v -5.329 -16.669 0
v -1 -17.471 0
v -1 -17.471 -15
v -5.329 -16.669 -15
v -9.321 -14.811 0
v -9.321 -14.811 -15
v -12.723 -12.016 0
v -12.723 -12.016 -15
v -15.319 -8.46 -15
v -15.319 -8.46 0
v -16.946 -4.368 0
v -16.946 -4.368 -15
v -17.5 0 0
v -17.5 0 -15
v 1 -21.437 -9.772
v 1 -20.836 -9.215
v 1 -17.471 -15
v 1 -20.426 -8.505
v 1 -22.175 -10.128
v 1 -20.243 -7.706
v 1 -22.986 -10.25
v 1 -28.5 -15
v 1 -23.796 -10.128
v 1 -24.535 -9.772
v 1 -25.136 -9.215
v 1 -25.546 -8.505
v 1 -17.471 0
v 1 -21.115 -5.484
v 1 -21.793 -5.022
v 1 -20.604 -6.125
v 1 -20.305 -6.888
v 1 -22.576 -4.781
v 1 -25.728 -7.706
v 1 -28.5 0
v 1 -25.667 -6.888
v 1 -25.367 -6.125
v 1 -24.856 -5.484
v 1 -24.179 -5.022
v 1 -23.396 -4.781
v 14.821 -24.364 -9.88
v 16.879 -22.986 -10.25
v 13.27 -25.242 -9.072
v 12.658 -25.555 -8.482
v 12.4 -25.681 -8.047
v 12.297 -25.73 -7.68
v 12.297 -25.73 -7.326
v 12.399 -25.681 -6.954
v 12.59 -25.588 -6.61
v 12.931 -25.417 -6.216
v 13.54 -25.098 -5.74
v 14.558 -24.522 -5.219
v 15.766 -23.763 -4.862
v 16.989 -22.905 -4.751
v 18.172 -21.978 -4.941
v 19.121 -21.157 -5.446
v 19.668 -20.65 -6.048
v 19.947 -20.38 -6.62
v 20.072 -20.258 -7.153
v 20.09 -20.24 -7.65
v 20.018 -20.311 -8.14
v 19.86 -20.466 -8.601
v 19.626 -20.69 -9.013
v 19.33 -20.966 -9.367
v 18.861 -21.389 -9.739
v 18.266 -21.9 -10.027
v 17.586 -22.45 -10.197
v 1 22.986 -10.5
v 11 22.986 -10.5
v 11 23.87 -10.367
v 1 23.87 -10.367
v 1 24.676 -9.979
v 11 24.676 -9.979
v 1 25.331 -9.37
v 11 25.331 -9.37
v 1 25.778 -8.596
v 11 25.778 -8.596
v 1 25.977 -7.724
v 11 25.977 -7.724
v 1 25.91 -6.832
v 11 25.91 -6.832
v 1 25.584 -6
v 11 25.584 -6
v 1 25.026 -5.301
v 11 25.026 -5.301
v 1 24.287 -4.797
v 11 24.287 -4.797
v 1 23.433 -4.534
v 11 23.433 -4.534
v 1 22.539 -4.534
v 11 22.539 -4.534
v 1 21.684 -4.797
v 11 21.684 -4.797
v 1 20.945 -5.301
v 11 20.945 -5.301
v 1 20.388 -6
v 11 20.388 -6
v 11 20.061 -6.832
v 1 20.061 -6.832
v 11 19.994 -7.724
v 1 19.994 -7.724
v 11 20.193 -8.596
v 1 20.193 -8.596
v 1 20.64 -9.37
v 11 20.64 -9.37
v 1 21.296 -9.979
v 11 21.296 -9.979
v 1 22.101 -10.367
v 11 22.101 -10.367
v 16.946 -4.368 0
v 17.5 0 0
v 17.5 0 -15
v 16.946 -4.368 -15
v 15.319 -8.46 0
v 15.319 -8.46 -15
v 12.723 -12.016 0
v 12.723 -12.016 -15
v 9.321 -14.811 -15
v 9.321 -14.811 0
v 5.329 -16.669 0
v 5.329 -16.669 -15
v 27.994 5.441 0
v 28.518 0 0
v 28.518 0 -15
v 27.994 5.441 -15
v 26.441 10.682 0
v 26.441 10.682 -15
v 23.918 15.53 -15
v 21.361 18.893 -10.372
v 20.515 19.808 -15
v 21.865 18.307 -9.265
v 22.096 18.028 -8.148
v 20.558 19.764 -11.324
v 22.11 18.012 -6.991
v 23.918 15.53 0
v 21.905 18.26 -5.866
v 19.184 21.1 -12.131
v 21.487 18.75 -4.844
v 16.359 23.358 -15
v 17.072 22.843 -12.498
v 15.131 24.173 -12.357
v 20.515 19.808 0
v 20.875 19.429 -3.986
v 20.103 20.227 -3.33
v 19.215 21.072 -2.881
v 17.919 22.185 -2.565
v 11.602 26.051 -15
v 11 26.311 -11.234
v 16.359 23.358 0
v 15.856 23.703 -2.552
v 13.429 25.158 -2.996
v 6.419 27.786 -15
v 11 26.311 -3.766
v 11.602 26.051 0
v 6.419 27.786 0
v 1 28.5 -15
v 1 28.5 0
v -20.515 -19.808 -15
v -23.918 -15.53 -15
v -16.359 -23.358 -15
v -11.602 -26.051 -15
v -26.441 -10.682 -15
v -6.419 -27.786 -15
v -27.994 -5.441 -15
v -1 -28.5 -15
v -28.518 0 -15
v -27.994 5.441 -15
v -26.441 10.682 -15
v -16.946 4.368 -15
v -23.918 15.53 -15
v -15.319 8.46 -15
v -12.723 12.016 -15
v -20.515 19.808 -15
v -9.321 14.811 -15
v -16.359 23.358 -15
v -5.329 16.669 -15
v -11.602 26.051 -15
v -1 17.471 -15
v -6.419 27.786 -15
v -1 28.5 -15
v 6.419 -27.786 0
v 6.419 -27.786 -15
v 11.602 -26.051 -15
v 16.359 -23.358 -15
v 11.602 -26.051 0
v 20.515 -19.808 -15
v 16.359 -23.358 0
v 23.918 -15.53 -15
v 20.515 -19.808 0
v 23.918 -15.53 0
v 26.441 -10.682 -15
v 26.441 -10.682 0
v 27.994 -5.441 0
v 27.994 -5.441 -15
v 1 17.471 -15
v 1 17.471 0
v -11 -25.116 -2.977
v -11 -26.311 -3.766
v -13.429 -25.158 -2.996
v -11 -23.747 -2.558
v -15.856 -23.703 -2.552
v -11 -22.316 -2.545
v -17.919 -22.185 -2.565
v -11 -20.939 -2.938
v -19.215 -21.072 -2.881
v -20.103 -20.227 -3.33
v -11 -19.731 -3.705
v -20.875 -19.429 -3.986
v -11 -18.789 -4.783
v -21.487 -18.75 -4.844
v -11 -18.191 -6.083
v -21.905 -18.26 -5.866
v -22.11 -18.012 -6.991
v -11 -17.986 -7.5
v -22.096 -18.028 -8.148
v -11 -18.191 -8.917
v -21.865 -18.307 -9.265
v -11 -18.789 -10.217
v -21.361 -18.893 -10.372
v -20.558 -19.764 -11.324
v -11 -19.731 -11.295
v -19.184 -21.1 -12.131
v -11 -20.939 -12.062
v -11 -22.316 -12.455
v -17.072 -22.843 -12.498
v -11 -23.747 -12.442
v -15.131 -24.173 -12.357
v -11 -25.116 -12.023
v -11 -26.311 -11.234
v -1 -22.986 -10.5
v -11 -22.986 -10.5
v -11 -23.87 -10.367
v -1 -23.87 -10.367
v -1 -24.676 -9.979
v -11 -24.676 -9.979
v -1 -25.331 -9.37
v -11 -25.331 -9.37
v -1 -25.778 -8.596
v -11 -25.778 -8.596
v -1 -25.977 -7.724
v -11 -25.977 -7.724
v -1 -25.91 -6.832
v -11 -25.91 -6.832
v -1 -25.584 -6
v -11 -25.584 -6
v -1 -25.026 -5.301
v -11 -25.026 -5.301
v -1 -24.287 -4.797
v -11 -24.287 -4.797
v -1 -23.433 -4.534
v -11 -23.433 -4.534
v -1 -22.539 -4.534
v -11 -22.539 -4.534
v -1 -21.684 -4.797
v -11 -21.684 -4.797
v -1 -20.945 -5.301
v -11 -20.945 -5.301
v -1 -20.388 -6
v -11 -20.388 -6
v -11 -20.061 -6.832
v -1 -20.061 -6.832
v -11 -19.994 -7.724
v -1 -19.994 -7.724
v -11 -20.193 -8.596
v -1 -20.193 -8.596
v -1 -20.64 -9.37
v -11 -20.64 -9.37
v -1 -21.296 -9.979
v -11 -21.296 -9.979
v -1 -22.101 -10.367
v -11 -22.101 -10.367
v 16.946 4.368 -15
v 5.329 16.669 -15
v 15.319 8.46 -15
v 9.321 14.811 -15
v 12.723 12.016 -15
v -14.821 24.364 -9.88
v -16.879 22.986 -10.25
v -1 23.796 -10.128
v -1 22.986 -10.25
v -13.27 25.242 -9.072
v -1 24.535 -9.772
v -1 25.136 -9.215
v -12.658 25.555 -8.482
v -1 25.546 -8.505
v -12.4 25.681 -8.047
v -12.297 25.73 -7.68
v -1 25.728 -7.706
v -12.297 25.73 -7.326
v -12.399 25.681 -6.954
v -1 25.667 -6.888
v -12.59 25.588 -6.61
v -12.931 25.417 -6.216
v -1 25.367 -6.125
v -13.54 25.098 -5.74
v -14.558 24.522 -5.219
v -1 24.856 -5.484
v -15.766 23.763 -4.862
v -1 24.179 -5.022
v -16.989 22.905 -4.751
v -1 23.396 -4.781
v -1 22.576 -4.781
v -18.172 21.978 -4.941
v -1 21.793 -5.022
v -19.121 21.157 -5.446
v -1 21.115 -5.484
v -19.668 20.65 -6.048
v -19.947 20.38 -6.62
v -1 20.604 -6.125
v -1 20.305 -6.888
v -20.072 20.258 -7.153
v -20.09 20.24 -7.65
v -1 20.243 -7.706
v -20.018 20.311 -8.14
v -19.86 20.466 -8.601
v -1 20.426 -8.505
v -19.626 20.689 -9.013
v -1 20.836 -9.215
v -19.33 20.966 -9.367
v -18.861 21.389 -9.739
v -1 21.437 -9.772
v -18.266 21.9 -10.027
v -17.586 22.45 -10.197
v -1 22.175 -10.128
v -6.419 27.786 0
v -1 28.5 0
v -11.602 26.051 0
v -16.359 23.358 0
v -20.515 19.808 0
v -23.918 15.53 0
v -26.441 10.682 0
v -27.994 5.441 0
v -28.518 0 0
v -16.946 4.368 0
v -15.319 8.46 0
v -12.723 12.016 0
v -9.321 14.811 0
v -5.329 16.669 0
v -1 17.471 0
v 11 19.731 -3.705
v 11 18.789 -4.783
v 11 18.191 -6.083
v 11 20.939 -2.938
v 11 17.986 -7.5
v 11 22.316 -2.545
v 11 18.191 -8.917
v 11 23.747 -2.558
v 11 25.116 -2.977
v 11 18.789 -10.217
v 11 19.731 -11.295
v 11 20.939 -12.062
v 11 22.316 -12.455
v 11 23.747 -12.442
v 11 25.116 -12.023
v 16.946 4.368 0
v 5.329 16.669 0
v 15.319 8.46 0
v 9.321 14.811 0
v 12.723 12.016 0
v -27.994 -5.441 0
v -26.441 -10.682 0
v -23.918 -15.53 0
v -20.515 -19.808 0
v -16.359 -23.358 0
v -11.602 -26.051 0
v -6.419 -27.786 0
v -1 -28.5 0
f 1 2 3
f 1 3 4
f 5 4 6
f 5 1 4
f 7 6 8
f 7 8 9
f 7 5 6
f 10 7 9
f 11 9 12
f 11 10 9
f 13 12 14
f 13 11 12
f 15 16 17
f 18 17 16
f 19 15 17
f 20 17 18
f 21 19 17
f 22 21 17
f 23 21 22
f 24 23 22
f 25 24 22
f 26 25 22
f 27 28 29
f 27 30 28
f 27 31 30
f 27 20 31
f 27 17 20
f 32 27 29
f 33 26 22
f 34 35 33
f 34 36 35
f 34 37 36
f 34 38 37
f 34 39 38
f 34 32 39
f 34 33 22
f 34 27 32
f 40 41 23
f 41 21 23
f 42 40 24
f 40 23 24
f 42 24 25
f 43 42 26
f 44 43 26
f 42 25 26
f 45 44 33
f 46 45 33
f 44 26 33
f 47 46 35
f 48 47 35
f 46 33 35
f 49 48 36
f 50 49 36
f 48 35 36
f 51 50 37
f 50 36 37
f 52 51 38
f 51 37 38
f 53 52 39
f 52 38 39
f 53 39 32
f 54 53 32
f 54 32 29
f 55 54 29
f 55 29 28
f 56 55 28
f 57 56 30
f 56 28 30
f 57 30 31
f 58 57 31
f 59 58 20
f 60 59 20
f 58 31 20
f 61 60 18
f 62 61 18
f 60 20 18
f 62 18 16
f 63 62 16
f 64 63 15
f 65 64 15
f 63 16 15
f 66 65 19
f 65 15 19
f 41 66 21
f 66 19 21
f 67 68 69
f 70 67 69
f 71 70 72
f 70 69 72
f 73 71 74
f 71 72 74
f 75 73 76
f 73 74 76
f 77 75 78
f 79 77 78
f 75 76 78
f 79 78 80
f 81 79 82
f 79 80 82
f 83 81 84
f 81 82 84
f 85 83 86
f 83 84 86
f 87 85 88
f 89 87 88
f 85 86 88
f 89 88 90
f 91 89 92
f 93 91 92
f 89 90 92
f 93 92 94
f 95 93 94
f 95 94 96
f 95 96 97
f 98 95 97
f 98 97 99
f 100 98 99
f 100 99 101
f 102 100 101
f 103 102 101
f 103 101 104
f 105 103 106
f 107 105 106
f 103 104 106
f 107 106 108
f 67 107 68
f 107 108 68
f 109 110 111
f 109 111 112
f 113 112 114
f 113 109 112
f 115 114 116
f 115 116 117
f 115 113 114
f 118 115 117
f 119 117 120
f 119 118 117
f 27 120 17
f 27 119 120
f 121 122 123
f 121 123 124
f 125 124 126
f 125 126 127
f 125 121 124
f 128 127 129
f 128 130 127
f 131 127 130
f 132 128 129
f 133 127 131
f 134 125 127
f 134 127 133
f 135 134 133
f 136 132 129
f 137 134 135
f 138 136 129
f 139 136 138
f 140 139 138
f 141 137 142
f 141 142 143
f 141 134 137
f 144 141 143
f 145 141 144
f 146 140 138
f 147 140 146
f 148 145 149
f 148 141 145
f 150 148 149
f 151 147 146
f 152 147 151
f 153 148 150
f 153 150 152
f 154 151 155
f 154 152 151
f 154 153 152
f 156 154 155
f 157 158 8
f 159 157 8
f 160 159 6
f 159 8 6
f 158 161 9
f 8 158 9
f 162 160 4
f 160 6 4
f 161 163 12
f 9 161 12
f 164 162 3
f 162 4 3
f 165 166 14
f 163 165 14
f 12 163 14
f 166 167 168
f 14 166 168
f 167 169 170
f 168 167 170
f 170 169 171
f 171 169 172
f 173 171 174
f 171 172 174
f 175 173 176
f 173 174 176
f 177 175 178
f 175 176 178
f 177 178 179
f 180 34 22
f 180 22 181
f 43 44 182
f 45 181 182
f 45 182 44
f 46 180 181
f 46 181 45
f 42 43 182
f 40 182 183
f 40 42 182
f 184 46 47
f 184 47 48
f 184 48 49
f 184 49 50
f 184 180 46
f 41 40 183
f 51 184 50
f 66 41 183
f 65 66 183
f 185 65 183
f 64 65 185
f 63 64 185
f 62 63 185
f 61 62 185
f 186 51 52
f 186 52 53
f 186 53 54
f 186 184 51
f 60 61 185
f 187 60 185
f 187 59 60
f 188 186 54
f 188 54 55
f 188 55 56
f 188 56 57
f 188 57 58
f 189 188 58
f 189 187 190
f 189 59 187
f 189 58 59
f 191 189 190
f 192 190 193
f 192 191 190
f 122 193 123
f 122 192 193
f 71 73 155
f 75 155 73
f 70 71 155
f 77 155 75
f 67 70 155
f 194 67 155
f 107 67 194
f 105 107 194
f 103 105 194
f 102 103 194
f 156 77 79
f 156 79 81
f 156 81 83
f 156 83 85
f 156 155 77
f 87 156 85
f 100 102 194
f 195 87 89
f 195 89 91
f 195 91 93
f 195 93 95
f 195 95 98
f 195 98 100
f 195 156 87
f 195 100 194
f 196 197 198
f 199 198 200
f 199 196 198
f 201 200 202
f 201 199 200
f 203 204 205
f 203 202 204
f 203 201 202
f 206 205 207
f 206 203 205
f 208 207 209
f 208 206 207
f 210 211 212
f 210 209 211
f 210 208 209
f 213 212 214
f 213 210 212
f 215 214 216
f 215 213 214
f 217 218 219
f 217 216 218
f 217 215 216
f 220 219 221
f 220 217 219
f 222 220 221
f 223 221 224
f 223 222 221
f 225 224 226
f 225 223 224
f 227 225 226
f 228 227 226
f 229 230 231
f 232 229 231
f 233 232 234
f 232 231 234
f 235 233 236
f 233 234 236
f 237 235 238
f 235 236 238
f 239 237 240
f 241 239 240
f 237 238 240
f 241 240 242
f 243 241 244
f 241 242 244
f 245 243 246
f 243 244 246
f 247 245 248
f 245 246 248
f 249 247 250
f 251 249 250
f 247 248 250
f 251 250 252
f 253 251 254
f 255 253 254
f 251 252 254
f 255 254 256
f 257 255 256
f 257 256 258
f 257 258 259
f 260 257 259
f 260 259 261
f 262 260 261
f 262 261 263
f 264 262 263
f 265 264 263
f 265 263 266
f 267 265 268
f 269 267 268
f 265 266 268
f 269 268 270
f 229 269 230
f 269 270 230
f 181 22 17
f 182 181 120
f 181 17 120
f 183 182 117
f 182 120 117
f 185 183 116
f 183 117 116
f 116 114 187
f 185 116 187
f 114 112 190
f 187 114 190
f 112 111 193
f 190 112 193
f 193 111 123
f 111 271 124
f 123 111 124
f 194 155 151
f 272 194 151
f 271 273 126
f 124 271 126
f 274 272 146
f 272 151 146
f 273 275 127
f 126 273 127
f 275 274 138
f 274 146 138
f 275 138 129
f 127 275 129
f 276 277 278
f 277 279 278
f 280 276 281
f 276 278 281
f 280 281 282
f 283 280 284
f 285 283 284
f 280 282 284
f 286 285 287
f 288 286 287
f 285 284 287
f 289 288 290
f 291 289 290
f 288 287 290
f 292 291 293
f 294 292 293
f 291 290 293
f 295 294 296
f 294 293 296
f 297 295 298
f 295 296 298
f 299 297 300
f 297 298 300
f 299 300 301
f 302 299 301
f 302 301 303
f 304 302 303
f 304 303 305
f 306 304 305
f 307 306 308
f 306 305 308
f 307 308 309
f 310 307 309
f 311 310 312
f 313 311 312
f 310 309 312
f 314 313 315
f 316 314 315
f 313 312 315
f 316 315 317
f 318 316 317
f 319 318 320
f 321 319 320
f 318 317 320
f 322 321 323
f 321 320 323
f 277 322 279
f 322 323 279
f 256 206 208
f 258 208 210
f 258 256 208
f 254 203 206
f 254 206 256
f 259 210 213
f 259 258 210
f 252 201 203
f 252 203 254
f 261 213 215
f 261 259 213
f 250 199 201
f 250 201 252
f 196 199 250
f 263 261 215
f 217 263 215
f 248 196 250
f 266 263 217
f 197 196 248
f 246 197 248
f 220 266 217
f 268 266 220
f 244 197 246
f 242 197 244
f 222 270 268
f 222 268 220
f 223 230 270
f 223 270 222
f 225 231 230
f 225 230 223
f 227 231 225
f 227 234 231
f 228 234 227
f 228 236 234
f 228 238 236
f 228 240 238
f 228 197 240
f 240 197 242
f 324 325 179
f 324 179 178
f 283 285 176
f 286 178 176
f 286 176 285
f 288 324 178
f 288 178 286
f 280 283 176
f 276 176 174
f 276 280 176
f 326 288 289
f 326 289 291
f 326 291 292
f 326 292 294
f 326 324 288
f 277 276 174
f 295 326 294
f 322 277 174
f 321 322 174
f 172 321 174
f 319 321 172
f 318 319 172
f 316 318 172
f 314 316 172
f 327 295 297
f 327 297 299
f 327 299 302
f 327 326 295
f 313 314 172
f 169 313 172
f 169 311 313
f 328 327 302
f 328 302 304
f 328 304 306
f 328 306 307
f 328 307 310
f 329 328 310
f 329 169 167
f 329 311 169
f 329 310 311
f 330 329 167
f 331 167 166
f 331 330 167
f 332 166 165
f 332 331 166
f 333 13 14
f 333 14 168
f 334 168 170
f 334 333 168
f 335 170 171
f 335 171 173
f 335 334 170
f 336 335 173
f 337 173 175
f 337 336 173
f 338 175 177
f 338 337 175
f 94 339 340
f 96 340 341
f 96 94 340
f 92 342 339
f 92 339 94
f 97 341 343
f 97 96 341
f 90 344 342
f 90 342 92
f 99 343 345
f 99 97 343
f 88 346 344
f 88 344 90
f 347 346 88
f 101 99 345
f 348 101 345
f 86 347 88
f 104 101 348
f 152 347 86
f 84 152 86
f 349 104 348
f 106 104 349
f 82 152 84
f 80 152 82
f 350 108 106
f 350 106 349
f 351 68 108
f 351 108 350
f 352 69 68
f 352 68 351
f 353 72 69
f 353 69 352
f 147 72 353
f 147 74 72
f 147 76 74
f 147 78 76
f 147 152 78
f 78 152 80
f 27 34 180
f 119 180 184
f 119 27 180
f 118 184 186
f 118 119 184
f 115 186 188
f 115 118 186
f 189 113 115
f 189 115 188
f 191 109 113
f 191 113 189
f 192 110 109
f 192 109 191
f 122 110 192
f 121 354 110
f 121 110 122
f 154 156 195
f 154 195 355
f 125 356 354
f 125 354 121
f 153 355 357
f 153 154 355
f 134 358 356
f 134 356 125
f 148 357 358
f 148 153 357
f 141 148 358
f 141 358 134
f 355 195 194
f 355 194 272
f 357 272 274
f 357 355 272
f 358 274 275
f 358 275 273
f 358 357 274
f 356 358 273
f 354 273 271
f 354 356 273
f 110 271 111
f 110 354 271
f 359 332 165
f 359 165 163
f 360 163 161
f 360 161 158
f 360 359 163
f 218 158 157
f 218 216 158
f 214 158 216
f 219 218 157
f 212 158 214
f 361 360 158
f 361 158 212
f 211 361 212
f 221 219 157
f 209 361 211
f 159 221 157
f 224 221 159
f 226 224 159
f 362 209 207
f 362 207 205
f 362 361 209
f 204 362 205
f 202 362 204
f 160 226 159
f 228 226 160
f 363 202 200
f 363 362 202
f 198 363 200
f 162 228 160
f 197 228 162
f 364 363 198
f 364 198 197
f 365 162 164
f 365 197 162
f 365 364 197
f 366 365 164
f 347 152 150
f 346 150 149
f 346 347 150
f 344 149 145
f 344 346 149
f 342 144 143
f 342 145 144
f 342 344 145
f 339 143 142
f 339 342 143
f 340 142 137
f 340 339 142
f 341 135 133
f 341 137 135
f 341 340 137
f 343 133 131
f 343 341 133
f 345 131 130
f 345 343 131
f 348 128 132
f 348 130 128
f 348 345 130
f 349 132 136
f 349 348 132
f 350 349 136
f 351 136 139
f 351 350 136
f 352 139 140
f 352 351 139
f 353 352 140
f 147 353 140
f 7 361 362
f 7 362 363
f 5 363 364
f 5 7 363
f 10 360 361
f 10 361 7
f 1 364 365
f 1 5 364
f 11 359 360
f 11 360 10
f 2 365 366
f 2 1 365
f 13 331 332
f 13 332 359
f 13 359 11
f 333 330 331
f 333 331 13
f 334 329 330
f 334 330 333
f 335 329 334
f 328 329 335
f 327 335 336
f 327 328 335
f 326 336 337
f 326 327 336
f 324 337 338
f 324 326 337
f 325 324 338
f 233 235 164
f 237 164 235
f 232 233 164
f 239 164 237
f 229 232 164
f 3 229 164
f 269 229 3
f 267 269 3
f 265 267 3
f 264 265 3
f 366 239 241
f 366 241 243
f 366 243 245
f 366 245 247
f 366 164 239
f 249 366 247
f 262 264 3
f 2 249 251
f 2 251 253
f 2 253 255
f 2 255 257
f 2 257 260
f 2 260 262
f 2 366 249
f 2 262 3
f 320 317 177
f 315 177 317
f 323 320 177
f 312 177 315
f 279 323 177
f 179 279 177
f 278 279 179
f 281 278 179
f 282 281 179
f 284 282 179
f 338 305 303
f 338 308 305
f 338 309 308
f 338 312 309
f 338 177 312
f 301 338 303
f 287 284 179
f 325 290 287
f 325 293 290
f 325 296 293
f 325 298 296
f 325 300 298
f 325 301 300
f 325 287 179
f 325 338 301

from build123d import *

# Parameters (mm, degrees)
EXTRUDE_1_DEPTH          = 15
EXTRUDE_1_2_DEPTH        = 15
SKETCH_2_R               = 2.75
CUT_EXTRUDE_1_DEPTH      = 29.517538463
SKETCH_3_R               = 5
CUT_EXTRUDE_2_DEPTH      = 18.517538563
SKETCH_4_R               = 3
CUT_EXTRUDE_3_DEPTH      = 10
PATTERN_CIRCULAR_1_COUNT = 2


with BuildPart() as part:
    # Эскиз1 → Бобышка-Вытянуть1 (new body)
    with BuildSketch(Plane.XY):
        with BuildLine():
            ThreePointArc((-1, 28.5), (-20.515451963, 19.808236438), (-28.517538463, 0))
            ThreePointArc((-28.517538463, 0), (-20.515451963, -19.808236438), (-1, -28.5))
            Line((-1, -28.5), (-1, -17.47140521))
            ThreePointArc((-1, -17.47140521), (-12.72301065, -12.015614841), (-17.5, 0))
            ThreePointArc((-17.5, 0), (-12.72301065, 12.015614841), (-1, 17.47140521))
            Line((-1, 17.47140521), (-1, 28.5))
        make_face()
    extrude(amount=-EXTRUDE_1_DEPTH)


with BuildPart() as body_2:
    # Эскиз1 → Extrude 1 2 (new body)
    with BuildSketch(Plane.XY):
        with BuildLine():
            Line((1, -17.47140521), (1, -28.5))
            ThreePointArc((1, -28.5), (20.515451963, -19.808236438), (28.517538463, 0))
            ThreePointArc((28.517538463, 0), (20.515451963, 19.808236438), (1, 28.5))
            Line((1, 28.5), (1, 17.47140521))
            ThreePointArc((1, 17.47140521), (12.72301065, 12.015614841), (17.5, 0))
            ThreePointArc((17.5, 0), (12.72301065, -12.015614841), (1, -17.47140521))
        make_face()
    extrude(amount=-EXTRUDE_1_2_DEPTH)


with BuildPart() as cut_extrude_1_tool:
    # Эскиз2 → Вырез-Вытянуть1 (new body, symmetric)
    with BuildSketch(Plane(origin=(0, 0, 0), x_dir=(0, 0, -1), z_dir=(1, 0, 0))):
        with Locations((7.5, 22.985702605)):
            Circle(SKETCH_2_R)
    cut_extrude_1 = extrude(amount=CUT_EXTRUDE_1_DEPTH, both=True)


with BuildPart() as part_1:
    add(part.part)

    # Вырез-Вытянуть1: cut by cut_extrude_1_tool
    add(cut_extrude_1_tool.part, mode=Mode.SUBTRACT)


with BuildPart() as body_2_1:
    add(body_2.part)

    # Вырез-Вытянуть1: cut by cut_extrude_1_tool
    add(cut_extrude_1_tool.part, mode=Mode.SUBTRACT)

    # Эскиз3 → Вырез-Вытянуть2 (cut, through all)
    with BuildSketch(Plane(origin=(11, 0, 0), x_dir=(0, 0, -1), z_dir=(1, 0, 0))):
        with Locations((7.5, 22.985702605)):
            Circle(SKETCH_3_R)
    cut_extrude_2 = extrude(amount=CUT_EXTRUDE_2_DEPTH, mode=Mode.SUBTRACT)

    # Эскиз4 → Вырез-Вытянуть3 (cut)
    with BuildSketch(Plane(origin=(11, 0, 0), x_dir=(0, 0, -1), z_dir=(1, 0, 0))):
        with Locations((7.5, 22.985702605)):
            Circle(SKETCH_4_R)
    cut_extrude_3 = extrude(amount=-CUT_EXTRUDE_3_DEPTH, mode=Mode.SUBTRACT)


with BuildPart() as pattern_circular_1_tool:
    # Круговой массив1: Вырез-Вытянуть1, Вырез-Вытянуть2, Вырез-Вытянуть3 ×2 about axis
    pattern_circular_1_axis = Axis((0, 0, -80.9), (0, 0, 1))
    for i in range(1, PATTERN_CIRCULAR_1_COUNT):
        add(cut_extrude_1.rotate(pattern_circular_1_axis, i * 360 / PATTERN_CIRCULAR_1_COUNT))
        add(cut_extrude_2.rotate(pattern_circular_1_axis, i * 360 / PATTERN_CIRCULAR_1_COUNT))
        add(cut_extrude_3.rotate(pattern_circular_1_axis, i * 360 / PATTERN_CIRCULAR_1_COUNT))


with BuildPart() as part_2:
    add(part_1.part)

    # Круговой массив1: cut by pattern_circular_1_tool
    add(pattern_circular_1_tool.part, mode=Mode.SUBTRACT)


with BuildPart() as body_2_2:
    add(body_2_1.part)

    # Круговой массив1: cut by pattern_circular_1_tool
    add(pattern_circular_1_tool.part, mode=Mode.SUBTRACT)


solid = Compound([part_2.part, body_2_2.part])
